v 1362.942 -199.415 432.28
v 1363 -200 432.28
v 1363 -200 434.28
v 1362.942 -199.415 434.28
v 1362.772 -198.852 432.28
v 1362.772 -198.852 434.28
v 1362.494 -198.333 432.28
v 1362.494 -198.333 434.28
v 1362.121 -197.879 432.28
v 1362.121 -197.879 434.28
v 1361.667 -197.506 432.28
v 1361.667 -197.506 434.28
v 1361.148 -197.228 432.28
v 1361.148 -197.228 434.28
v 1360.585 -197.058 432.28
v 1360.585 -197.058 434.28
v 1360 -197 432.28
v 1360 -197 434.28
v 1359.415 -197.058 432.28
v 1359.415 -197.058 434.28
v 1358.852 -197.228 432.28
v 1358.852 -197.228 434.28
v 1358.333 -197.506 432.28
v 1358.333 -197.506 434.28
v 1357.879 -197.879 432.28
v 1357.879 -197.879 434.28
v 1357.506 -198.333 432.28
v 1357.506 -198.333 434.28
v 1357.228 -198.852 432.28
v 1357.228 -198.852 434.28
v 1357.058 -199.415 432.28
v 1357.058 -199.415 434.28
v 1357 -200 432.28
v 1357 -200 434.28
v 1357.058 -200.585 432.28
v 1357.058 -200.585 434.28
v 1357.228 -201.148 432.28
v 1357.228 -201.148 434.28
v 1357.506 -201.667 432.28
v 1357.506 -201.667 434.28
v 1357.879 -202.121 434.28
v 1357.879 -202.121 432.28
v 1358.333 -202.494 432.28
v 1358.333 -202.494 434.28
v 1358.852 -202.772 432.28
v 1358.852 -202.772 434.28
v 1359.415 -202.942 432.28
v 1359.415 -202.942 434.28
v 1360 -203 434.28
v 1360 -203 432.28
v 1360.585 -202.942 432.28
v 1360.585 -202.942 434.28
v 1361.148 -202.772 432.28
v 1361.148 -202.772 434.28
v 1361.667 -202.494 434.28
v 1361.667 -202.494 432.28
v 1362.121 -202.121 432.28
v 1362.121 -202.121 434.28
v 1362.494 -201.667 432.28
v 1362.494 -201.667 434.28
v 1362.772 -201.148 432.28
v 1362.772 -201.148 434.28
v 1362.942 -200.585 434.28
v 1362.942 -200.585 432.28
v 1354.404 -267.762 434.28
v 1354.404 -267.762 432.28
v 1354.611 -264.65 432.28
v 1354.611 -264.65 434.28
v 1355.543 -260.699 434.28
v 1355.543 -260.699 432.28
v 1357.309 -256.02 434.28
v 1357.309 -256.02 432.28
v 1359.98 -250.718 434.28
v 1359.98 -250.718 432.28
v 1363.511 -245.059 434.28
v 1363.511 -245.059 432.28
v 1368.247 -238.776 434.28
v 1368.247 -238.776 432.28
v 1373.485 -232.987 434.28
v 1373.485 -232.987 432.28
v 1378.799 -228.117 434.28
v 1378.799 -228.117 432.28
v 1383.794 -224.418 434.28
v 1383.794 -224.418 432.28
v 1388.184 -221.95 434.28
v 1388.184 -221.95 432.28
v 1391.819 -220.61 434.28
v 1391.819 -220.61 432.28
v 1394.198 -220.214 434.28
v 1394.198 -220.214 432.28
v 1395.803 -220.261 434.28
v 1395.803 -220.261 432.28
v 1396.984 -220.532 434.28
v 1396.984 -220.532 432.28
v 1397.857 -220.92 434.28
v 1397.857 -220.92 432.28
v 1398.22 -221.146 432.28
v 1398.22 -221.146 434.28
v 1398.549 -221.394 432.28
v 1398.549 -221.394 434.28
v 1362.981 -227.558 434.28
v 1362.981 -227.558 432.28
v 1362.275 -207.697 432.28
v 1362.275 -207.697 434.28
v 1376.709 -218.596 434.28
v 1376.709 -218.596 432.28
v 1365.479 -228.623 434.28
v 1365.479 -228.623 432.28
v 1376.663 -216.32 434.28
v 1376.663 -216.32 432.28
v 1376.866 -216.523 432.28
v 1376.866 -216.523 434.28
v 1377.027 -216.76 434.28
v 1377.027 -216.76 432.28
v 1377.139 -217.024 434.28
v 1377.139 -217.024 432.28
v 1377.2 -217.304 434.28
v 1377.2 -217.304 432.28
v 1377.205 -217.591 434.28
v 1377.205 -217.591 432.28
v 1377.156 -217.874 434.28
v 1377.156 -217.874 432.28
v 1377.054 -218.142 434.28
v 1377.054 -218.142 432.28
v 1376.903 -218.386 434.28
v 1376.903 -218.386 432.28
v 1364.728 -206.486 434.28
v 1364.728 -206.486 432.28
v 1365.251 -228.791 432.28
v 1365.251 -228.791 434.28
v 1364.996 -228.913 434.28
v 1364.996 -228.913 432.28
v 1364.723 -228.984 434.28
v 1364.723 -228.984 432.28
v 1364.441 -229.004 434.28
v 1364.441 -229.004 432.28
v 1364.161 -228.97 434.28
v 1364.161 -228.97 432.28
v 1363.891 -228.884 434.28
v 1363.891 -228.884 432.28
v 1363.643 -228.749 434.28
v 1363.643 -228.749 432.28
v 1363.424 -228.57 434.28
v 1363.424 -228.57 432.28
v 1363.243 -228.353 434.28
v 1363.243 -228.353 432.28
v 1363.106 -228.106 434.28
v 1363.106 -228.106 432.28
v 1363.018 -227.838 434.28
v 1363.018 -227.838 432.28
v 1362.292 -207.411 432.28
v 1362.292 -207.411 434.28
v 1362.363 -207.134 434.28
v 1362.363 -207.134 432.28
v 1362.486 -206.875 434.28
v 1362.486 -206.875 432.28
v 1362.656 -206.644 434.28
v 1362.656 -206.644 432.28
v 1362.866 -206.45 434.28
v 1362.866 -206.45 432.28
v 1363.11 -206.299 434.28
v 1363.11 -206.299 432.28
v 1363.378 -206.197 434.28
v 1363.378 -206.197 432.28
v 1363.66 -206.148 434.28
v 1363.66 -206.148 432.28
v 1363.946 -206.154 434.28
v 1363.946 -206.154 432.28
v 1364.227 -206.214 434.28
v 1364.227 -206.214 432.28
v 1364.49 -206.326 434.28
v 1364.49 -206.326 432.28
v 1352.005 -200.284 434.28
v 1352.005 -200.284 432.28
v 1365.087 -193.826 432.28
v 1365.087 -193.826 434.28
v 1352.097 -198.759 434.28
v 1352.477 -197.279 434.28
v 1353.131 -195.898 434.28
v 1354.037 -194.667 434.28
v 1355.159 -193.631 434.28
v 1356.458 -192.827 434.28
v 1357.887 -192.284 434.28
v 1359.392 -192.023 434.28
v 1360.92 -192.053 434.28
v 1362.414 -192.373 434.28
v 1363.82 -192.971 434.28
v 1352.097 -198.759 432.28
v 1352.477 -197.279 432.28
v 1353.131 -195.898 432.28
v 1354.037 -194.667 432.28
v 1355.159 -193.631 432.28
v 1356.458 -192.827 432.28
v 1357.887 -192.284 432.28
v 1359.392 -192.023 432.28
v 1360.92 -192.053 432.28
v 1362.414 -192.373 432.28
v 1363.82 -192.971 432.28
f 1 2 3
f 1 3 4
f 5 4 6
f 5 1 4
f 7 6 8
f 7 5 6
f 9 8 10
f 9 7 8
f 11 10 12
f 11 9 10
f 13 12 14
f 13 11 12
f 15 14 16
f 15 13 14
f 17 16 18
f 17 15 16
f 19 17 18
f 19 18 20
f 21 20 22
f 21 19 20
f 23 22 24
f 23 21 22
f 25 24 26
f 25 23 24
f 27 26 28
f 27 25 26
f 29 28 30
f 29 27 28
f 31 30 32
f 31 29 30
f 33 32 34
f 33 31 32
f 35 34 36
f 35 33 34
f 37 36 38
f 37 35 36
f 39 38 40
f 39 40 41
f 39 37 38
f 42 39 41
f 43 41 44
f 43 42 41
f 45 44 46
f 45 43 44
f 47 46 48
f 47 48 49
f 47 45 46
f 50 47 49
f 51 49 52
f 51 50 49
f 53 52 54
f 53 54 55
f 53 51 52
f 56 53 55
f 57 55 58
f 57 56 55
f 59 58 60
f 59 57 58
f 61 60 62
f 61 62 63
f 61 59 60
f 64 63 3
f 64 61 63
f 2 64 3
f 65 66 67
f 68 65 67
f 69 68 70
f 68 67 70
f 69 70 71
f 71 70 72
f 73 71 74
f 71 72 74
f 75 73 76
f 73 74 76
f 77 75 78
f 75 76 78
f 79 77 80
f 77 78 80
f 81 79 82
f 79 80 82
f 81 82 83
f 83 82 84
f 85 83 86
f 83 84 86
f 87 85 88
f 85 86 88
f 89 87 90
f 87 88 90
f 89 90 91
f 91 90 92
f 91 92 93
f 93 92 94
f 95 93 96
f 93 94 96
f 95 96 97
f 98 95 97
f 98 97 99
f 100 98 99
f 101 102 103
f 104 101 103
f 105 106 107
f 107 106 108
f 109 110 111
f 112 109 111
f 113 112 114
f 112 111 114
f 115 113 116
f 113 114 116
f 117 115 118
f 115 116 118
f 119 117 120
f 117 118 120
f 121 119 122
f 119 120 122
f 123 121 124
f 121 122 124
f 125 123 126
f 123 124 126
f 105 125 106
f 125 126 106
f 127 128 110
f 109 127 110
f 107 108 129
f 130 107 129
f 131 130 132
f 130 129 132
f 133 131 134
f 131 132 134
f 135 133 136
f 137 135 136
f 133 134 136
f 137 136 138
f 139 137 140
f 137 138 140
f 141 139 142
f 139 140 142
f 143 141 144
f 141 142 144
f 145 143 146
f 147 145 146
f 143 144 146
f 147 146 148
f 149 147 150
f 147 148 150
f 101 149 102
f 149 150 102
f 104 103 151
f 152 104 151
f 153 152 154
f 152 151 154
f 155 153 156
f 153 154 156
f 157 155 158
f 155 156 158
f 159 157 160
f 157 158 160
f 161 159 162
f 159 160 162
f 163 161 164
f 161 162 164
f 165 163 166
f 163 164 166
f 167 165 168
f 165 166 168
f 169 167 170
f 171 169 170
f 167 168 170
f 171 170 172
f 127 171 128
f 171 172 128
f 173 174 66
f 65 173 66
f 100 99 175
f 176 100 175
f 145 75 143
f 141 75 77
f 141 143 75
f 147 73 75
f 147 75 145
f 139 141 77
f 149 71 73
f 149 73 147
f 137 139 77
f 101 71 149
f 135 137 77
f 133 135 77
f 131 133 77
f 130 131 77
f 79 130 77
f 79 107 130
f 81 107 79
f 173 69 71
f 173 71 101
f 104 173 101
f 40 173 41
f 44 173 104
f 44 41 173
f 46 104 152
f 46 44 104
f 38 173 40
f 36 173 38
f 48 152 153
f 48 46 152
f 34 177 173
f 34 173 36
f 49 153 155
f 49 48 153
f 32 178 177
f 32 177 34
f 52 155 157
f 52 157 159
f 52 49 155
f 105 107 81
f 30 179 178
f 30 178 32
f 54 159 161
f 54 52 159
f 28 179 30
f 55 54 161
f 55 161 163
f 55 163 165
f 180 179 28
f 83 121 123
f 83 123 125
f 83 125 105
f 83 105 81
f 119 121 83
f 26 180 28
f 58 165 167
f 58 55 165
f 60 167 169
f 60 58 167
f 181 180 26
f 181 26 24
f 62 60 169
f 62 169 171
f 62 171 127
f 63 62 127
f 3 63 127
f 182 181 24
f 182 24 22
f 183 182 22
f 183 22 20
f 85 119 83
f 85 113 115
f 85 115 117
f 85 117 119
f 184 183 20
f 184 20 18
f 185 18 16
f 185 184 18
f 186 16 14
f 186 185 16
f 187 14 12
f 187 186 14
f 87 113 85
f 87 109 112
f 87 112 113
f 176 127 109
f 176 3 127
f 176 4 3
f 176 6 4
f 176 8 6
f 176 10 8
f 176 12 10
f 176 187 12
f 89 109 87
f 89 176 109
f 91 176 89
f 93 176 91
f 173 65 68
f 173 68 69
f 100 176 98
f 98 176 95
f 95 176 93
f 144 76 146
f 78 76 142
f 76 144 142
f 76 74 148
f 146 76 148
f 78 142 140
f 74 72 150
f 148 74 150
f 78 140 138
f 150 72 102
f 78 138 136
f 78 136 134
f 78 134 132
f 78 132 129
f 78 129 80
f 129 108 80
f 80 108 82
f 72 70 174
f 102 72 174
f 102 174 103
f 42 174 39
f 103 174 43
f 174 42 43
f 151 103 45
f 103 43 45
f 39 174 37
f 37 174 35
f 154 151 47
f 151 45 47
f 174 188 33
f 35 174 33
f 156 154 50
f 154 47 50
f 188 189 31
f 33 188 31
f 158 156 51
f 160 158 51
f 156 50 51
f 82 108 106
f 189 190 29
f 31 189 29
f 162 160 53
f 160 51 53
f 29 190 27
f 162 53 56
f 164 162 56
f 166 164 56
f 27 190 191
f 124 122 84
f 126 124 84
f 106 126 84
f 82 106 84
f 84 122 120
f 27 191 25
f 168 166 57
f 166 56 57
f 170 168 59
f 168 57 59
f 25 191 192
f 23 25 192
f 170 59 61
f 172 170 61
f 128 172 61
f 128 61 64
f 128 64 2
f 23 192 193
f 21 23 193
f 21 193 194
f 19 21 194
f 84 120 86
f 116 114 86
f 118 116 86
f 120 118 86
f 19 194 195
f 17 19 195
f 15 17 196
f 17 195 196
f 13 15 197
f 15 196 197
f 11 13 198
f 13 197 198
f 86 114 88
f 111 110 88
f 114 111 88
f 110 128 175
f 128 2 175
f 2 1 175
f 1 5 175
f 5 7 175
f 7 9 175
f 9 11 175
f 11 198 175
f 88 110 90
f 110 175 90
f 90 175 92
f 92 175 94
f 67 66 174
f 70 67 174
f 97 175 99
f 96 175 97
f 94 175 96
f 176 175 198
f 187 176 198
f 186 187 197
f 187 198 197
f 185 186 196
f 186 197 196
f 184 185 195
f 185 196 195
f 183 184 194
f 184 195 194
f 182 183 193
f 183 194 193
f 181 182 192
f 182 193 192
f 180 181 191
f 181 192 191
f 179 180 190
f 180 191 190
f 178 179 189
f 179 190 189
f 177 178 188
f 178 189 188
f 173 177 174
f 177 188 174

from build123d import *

# Parameters (mm, degrees)
SZKIC1_R                    = 3
DODANIE_WYCI_GNI_CIE1_DEPTH = 2


with BuildPart() as part:
    # Szkic1 → Dodanie-wyciągnięcie1 (new body)
    with BuildSketch(Plane.XY.offset(432.28)):
        with BuildLine():
            Line((1352.005050304, -200.284217104), (1354.40386943, -267.762345401))
            add(Edge.make_bspline(
                [(1354.40386943, -267.762345401), (1353.432452758, -240.436659155), (1386.537067568, -211.615049683), (1398.527258098, -221.376205912), (1398.534359902, -221.381987456), (1398.541447396, -221.387791883), (1398.548520531, -221.39361923)],
                knots=[0.085287538, 0.085287538, 0.085287538, 0.085287538, 0.5, 0.5, 0.5, 0.500549055, 0.500549055, 0.500549055, 0.500549055], degree=3, weights=[0.71704156, 0.352730571, 0.447050051, 1, 0.999267927, 0.998536659, 0.997806194]))
            Line((1398.548520531, -221.39361923), (1365.086912411, -193.825591355))
            ThreePointArc((1365.086912411, -193.825591355), (1356.458442171, -192.82662087), (1352.005050304, -200.284217104))
        make_face()
        with Locations((1360, -200)):
            Circle(SZKIC1_R, mode=Mode.SUBTRACT)
        with BuildLine():
            Line((1364.727751429, -206.486395657), (1376.663408593, -216.319830088))
            ThreePointArc((1376.663408593, -216.319830088), (1377.209316374, -217.447726709), (1376.708653422, -218.596422797))
            Line((1376.708653422, -218.596422797), (1365.479018228, -228.62319398))
            ThreePointArc((1365.479018228, -228.62319398), (1363.891437533, -228.884020586), (1362.980924254, -227.557593599))
            Line((1362.980924254, -227.557593599), (1362.274902284, -207.697387985))
            ThreePointArc((1362.274902284, -207.697387985), (1363.109913259, -206.299088691), (1364.727751429, -206.486395657))
        make_face(mode=Mode.SUBTRACT)
    extrude(amount=DODANIE_WYCI_GNI_CIE1_DEPTH)


solid = part.part
